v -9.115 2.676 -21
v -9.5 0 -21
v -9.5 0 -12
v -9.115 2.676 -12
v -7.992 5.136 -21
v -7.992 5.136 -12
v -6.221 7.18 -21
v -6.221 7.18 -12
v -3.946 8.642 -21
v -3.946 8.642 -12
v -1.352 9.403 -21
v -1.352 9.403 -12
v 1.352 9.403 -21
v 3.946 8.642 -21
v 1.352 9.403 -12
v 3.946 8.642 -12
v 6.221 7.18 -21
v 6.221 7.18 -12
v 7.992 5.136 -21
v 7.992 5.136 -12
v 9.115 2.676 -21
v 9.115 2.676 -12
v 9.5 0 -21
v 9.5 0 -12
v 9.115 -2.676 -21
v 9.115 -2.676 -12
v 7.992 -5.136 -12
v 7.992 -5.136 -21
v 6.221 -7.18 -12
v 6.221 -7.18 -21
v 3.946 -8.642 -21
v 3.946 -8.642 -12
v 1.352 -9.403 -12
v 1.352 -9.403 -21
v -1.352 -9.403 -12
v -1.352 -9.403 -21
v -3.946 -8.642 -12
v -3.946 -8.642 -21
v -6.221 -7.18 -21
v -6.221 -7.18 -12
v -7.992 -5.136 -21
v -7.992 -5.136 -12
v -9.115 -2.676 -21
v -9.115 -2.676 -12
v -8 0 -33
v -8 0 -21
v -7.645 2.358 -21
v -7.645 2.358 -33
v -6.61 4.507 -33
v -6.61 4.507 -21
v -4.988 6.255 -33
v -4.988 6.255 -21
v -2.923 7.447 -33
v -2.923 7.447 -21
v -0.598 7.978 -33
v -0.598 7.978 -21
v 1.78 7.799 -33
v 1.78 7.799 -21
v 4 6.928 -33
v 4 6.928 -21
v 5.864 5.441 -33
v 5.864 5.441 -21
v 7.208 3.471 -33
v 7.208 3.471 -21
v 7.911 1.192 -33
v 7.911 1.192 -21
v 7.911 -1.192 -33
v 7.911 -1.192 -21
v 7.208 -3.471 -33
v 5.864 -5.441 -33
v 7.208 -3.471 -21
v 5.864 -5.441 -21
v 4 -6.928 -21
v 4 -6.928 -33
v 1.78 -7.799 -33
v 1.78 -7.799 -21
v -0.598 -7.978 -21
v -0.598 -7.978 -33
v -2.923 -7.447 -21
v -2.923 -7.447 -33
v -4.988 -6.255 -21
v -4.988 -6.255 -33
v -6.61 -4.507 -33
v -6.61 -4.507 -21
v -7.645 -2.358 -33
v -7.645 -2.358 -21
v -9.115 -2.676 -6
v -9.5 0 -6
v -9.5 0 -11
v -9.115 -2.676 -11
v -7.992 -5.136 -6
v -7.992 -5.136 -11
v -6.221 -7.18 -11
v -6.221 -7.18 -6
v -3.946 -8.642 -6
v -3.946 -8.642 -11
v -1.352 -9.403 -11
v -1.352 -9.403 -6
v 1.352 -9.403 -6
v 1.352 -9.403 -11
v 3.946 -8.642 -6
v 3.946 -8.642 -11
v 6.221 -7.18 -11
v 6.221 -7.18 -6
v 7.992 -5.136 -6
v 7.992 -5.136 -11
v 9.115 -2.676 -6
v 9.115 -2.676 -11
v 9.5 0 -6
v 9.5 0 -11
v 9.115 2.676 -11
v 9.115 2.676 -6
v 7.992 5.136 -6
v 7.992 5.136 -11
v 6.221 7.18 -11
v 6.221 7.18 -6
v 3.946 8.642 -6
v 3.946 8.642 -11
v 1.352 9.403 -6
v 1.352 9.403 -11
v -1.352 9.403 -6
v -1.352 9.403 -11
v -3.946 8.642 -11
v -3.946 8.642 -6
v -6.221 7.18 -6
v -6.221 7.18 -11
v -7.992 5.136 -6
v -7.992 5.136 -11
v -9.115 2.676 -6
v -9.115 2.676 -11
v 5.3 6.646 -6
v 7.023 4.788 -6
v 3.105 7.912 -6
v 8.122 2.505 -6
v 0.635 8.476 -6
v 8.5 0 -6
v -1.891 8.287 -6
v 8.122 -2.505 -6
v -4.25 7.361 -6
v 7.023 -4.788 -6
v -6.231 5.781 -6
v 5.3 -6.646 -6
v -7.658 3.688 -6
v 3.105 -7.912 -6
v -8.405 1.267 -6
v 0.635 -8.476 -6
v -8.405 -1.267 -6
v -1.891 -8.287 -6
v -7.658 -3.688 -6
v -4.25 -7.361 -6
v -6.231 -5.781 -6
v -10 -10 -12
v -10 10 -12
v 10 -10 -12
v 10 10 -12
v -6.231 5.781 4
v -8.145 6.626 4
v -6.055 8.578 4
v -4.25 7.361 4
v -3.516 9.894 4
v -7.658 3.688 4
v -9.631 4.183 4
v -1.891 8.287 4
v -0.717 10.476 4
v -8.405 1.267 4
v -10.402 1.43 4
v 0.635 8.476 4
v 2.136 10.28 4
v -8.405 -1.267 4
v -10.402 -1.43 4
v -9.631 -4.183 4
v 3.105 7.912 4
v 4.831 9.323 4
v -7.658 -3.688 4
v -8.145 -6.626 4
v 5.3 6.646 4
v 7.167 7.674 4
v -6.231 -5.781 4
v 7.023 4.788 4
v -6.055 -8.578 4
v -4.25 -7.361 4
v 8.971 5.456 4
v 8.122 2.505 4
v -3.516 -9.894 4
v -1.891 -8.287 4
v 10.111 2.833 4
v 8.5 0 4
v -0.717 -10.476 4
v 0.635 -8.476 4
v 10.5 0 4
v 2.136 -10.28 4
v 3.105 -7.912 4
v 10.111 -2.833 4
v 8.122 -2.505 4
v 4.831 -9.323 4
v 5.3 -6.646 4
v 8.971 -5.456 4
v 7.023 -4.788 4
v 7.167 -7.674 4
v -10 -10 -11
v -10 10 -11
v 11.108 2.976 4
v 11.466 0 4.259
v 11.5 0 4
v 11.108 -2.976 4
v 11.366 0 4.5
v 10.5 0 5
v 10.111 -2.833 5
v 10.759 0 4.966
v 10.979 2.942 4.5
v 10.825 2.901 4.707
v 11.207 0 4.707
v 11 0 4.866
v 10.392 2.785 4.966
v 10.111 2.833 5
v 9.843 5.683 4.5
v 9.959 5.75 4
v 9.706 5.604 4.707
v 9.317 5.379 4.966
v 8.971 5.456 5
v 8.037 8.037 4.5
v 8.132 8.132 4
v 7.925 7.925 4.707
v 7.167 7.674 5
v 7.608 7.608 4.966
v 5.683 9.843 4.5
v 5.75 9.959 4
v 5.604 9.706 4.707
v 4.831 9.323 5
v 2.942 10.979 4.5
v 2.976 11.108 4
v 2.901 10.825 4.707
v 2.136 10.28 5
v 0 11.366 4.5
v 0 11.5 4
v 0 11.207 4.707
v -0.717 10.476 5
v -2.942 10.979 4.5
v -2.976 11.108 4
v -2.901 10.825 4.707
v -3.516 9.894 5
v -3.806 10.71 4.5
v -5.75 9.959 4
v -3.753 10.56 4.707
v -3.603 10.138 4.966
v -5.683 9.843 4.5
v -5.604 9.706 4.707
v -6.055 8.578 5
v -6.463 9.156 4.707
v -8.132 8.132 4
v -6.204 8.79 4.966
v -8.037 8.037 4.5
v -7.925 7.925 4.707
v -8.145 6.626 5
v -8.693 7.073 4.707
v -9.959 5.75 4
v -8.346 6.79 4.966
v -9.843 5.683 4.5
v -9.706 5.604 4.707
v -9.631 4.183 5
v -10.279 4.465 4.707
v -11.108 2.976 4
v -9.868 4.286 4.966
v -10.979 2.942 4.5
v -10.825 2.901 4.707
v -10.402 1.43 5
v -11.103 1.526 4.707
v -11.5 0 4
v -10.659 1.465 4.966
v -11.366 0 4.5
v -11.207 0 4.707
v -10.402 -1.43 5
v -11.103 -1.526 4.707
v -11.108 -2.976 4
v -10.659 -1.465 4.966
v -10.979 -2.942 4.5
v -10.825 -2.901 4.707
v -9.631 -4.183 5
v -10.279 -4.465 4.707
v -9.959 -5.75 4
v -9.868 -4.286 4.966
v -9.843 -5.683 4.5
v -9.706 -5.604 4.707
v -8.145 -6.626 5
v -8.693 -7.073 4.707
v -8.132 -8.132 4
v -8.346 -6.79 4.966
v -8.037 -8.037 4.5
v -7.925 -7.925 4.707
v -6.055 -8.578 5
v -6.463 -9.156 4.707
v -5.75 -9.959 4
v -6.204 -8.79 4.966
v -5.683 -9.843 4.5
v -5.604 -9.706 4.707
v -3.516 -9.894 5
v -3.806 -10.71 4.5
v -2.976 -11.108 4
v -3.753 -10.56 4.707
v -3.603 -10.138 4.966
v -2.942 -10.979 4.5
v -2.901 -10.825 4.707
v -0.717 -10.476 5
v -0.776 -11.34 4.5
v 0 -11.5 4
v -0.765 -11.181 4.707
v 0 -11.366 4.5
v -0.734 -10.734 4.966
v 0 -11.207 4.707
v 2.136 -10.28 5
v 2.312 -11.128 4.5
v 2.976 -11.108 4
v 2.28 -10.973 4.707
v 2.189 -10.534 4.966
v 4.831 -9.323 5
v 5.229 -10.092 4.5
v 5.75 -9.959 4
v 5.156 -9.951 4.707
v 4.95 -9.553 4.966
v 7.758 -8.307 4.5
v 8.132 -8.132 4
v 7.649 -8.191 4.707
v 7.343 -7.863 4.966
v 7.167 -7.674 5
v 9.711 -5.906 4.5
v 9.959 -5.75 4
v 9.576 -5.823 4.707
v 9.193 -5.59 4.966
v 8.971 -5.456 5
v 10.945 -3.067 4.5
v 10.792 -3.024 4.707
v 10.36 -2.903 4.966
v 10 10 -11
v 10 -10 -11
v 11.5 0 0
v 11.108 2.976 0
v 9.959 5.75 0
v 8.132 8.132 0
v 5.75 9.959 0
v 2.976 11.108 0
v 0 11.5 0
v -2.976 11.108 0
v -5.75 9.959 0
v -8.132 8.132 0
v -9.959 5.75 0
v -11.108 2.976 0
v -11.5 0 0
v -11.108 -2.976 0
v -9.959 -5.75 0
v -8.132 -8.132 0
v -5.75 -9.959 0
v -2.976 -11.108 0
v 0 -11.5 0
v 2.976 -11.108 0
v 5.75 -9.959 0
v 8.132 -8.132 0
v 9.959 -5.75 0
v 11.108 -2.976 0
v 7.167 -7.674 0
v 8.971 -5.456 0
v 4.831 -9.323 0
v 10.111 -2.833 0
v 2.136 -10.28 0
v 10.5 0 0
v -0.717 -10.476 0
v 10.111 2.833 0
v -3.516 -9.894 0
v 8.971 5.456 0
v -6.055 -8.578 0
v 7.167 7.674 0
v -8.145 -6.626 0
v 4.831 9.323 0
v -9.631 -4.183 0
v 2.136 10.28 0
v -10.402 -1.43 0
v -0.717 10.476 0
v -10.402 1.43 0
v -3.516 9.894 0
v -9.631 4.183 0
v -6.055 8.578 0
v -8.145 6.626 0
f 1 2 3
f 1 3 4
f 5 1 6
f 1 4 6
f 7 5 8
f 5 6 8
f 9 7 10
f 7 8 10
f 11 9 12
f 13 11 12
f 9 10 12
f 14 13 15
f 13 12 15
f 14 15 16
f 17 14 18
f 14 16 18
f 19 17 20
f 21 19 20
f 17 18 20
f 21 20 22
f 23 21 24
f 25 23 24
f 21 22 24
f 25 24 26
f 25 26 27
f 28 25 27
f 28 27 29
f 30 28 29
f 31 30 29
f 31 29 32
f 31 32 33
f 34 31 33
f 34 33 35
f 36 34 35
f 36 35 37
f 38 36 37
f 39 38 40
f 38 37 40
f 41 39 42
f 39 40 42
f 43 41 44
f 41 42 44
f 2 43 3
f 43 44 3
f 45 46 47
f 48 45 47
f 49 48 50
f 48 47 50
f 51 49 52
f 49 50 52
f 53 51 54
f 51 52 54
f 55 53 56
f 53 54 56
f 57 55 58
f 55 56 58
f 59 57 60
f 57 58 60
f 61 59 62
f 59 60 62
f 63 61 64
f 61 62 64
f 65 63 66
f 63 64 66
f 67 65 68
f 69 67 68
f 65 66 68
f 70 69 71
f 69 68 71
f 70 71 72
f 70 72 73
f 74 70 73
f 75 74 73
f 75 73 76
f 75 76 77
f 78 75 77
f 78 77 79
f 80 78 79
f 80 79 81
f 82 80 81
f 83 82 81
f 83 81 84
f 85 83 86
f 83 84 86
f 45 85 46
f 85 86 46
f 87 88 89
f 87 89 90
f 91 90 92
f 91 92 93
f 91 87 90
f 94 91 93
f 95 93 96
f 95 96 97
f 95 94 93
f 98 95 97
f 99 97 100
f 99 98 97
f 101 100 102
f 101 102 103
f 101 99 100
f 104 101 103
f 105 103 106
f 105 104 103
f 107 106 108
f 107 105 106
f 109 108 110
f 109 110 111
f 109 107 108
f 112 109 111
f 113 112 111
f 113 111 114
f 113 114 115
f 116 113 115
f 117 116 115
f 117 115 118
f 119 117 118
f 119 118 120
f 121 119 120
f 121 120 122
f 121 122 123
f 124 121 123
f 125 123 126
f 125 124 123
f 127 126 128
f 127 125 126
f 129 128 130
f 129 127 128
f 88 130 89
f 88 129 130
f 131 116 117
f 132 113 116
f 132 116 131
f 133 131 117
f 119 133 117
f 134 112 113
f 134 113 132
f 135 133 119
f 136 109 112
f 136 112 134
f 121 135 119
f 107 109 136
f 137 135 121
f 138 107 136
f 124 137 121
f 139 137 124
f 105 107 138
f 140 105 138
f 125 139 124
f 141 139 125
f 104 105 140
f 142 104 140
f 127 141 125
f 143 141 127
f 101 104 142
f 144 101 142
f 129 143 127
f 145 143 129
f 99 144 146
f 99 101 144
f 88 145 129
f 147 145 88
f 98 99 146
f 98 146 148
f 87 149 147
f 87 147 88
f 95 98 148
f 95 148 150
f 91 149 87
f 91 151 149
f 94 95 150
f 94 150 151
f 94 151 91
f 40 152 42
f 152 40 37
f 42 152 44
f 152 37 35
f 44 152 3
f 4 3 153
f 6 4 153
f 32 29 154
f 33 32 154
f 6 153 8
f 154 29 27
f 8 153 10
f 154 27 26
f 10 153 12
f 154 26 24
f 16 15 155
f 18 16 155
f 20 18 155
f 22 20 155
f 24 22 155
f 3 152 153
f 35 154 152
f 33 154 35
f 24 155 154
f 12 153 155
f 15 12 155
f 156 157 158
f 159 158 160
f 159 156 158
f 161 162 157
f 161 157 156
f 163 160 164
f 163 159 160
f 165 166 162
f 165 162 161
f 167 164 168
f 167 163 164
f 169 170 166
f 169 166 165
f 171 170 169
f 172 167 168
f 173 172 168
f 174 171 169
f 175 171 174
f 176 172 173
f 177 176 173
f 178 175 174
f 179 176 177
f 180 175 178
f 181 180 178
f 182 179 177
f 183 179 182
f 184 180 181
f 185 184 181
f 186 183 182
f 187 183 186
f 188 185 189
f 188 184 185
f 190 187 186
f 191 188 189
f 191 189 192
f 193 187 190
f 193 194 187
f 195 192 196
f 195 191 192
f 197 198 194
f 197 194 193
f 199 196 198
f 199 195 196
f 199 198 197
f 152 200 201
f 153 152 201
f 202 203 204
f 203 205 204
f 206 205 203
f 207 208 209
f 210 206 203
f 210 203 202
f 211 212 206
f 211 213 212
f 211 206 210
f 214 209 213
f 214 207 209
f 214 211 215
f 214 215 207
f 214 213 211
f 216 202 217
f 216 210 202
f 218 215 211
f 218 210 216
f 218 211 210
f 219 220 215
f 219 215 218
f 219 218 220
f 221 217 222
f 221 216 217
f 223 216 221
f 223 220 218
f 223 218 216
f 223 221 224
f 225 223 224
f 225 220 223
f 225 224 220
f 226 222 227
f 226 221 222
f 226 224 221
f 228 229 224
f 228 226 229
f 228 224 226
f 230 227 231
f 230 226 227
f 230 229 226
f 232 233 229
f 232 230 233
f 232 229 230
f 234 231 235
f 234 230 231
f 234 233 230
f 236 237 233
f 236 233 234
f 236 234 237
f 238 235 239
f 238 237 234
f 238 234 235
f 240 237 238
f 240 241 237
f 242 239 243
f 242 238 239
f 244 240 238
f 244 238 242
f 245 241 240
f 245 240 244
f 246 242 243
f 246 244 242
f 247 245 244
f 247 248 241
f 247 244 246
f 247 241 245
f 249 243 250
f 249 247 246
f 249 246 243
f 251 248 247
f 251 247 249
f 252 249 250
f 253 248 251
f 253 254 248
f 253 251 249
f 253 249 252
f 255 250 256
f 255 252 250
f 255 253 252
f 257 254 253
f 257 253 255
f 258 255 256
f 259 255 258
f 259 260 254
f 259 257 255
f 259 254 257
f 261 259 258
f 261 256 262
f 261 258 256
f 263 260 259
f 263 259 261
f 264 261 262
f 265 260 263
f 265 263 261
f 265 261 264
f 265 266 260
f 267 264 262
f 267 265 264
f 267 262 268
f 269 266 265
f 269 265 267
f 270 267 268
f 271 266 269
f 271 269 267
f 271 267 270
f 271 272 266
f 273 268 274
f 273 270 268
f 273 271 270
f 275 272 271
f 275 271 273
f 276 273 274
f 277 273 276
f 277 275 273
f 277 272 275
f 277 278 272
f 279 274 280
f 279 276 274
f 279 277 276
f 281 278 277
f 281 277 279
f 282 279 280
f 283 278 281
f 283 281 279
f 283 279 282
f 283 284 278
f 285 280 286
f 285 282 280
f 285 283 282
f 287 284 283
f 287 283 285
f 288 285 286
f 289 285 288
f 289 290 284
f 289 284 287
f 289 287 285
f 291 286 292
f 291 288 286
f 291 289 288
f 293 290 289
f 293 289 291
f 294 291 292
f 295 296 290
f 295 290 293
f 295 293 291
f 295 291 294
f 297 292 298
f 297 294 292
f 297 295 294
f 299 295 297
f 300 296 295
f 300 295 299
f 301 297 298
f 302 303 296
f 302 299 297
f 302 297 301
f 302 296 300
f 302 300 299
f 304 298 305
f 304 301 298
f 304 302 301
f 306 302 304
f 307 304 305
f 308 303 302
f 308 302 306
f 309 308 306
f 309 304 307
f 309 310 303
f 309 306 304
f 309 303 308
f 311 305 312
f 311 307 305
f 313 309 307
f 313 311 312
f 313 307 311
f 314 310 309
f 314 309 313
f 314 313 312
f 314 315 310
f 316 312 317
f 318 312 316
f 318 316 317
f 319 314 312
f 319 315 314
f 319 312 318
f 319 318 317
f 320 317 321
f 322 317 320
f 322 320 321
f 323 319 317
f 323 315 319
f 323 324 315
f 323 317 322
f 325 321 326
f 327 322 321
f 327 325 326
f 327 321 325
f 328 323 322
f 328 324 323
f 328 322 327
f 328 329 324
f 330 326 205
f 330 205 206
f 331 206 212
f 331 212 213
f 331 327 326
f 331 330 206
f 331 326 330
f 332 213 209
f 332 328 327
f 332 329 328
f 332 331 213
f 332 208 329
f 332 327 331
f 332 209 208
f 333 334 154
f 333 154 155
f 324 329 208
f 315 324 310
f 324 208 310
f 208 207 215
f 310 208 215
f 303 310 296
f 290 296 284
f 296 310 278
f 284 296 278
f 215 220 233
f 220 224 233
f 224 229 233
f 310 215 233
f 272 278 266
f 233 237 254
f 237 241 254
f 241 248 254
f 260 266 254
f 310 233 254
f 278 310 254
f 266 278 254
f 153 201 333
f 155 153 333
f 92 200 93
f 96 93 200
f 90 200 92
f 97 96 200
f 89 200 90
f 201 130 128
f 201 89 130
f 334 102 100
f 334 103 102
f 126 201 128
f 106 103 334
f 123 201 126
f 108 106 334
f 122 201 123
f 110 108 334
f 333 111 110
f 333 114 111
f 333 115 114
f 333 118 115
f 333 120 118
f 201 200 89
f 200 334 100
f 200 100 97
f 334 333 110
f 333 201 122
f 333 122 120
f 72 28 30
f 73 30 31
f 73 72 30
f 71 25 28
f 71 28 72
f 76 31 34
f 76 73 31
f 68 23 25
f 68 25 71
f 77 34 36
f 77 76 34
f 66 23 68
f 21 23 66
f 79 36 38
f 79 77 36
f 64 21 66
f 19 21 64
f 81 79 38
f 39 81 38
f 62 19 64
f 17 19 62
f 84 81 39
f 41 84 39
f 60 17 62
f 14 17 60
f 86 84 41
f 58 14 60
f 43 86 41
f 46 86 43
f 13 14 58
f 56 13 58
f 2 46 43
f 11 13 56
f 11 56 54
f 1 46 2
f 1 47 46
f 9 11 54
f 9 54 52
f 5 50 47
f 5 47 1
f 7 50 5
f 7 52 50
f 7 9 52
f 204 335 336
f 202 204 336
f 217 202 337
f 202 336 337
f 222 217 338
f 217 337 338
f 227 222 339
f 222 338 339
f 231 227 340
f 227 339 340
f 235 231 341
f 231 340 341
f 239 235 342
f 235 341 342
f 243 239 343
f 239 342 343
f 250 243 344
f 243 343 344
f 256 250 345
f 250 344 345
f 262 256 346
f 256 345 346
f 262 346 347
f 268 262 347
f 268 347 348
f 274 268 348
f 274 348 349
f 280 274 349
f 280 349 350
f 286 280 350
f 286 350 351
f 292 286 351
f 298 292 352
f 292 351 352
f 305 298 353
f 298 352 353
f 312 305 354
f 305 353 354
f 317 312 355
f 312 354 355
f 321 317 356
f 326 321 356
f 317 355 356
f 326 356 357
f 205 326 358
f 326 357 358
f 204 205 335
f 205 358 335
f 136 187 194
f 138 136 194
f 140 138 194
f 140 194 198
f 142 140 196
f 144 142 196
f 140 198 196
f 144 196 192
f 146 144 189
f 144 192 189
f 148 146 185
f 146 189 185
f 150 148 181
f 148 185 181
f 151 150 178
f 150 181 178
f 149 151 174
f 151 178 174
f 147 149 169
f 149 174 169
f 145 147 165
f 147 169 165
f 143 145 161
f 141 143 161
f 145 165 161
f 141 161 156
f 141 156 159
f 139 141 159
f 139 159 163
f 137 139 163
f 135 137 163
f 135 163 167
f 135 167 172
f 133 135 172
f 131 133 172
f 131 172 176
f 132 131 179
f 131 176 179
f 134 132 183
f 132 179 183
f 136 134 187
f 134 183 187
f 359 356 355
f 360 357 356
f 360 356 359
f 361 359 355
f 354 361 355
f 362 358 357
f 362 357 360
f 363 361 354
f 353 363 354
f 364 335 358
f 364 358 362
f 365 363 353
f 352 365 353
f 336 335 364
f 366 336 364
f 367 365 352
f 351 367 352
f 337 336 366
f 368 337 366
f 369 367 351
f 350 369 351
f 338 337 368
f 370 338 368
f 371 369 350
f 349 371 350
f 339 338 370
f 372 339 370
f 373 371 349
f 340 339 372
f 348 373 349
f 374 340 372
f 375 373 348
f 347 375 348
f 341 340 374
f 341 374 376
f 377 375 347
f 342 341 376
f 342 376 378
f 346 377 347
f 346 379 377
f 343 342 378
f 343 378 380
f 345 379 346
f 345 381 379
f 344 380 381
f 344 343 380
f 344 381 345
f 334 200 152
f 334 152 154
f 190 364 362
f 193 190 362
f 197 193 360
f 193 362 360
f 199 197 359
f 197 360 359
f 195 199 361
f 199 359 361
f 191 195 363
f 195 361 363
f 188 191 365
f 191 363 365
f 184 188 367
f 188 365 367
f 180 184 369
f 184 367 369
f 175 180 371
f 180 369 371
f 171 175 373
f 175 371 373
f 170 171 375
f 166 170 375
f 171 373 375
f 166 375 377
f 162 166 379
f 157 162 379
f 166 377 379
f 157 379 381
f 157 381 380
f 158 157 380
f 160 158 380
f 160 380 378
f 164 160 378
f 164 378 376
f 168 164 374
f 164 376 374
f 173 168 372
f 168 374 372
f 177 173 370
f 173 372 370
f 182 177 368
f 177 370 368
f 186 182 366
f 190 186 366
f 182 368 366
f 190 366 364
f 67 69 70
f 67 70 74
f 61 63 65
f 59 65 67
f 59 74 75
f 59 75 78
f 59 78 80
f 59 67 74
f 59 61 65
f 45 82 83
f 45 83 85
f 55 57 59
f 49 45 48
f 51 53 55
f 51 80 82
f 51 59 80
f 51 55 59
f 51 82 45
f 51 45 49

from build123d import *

# Parameters (mm, degrees)
SKETCH_1_W          = 11.5
SKETCH_1_H          = 5
SKETCH_2_R          = 10.5
CUT_EXTRUDE_1_DEPTH = 4
SKETCH_3_R          = 8.5
EXTRUDE_1_DEPTH     = 10
SKETCH_4_R          = 9.5
EXTRUDE_2_DEPTH     = 5
SKETCH_5_W          = 20
SKETCH_5_H          = 20
EXTRUDE_3_DEPTH     = 1
SKETCH_6_R          = 9.5
EXTRUDE_4_DEPTH     = 9
SKETCH_7_R          = 8
EXTRUDE_5_DEPTH     = 12
FILLET_1_R          = 1


with BuildPart() as part:
    # 草图1 → 旋转1 (revolve)
    with BuildSketch(Plane(origin=(0, 0, 0), x_dir=(1, 0, 0), z_dir=(0, 1, 0))):
        with Locations((5.75, -2.5)):
            Rectangle(SKETCH_1_W, SKETCH_1_H)
    revolve(axis=Axis((0, 0, 0), (0, 0, 1)))

    # 草图2 → 切除-拉伸1 (cut)
    with BuildSketch(Plane(origin=(0, 0, 0), x_dir=(-1, 0, 0), z_dir=(0, 0, -1))):
        with Locations(Location((0, 0, 0), (0, 0, 180))):
            Circle(SKETCH_2_R)
    extrude(amount=-CUT_EXTRUDE_1_DEPTH, mode=Mode.SUBTRACT)

    # 草图3 → 凸台-拉伸1 (add)
    with BuildSketch(Plane(origin=(0, 0, 4), x_dir=(-1, 0, 0), z_dir=(0, 0, -1))):
        with Locations(Location((0, 0, 0), (0, 0, 180))):
            Circle(SKETCH_3_R)
    extrude(amount=EXTRUDE_1_DEPTH)

    # 草图4 → 凸台-拉伸2 (add)
    with BuildSketch(Plane.XY.offset(-6)):
        with Locations(Location((0, 0, 0), (0, 0, 180))):
            Circle(SKETCH_4_R)
    extrude(amount=-EXTRUDE_2_DEPTH)

    # 草图5 → 凸台-拉伸3 (add)
    with BuildSketch(Plane.XY.offset(-11)):
        Rectangle(SKETCH_5_W, SKETCH_5_H)
    extrude(amount=-EXTRUDE_3_DEPTH)

    # 草图6 → 凸台-拉伸4 (add)
    with BuildSketch(Plane(origin=(0, 0, -12), x_dir=(-1, 0, 0), z_dir=(0, 0, -1))):
        Circle(SKETCH_6_R)
    extrude(amount=EXTRUDE_4_DEPTH)

    # 草图7 → 凸台-拉伸5 (add)
    with BuildSketch(Plane(origin=(0, 0, -21), x_dir=(-1, 0, 0), z_dir=(0, 0, -1))):
        Circle(SKETCH_7_R)
    extrude(amount=EXTRUDE_5_DEPTH)

    # 圆角1
    fillet_1_edges = [part.edges().sort_by_distance(p)[0] for p in [
        (-11.5, 0, 5),
    ]]
    fillet(fillet_1_edges, radius=FILLET_1_R)


solid = part.part
